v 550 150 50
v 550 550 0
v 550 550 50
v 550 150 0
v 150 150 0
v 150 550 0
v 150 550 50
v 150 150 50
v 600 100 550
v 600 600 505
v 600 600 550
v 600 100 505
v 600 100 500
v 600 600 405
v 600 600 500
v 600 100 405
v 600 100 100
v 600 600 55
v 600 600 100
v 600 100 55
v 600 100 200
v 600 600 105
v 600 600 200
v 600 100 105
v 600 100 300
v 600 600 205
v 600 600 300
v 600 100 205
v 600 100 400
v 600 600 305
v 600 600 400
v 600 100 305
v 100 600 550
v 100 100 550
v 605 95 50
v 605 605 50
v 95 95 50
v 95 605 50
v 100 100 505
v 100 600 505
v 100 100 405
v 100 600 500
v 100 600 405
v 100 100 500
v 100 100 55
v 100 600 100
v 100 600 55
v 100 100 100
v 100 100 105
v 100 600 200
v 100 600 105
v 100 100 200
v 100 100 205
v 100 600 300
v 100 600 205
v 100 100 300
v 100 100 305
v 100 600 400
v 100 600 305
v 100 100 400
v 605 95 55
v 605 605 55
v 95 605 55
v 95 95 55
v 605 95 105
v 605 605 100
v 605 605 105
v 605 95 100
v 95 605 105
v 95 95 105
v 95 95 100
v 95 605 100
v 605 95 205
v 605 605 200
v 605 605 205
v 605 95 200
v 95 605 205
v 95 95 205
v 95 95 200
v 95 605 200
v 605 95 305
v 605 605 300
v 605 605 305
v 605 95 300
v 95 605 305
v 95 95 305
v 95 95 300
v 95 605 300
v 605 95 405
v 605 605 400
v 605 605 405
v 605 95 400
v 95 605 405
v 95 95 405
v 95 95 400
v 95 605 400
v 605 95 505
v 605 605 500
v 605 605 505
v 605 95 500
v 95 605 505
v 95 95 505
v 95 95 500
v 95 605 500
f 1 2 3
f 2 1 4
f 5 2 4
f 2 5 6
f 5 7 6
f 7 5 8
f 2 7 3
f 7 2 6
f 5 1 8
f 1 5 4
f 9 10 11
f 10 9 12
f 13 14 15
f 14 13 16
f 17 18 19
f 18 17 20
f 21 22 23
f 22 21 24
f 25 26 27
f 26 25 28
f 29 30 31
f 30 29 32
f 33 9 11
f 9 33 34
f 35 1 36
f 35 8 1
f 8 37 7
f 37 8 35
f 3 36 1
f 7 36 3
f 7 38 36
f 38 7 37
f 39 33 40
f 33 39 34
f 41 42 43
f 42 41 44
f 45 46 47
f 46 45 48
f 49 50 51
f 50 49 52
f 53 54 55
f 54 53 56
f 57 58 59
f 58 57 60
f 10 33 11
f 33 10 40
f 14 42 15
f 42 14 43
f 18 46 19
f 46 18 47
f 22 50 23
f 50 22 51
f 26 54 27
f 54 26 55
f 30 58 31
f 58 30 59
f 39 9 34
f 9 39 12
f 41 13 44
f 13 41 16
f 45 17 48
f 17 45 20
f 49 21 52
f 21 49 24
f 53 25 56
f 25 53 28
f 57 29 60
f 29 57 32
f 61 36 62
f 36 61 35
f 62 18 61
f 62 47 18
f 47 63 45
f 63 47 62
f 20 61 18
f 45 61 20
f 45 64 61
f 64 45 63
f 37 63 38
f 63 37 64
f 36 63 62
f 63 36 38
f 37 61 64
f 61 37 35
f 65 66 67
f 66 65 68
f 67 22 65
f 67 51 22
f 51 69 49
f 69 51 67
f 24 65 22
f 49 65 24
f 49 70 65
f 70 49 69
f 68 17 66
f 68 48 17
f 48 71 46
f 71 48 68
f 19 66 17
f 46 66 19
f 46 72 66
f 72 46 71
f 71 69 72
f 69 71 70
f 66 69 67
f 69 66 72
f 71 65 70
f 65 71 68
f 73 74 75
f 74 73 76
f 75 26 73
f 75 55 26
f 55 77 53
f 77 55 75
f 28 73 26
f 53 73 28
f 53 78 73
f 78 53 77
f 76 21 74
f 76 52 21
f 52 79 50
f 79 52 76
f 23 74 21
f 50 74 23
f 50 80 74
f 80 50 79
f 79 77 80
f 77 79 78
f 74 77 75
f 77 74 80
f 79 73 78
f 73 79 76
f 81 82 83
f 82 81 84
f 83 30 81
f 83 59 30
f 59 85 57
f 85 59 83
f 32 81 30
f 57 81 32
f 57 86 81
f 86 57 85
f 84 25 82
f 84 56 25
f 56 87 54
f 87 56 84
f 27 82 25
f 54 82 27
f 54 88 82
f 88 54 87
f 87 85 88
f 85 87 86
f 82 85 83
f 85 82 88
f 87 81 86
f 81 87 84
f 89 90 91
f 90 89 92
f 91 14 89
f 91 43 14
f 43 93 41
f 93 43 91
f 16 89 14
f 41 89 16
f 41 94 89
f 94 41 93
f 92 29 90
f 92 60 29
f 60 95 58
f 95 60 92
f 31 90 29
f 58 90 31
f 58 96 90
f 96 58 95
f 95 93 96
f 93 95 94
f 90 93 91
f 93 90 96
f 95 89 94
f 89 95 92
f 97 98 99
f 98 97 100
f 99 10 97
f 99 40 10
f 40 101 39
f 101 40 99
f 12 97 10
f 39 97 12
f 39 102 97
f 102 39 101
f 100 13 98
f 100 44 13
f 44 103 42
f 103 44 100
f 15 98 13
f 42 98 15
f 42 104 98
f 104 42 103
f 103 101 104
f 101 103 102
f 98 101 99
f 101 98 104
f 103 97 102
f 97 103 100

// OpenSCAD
  
// standalone

translate([150, 150, 0]){
    color("Black")
    cube([400, 400, 400]);
}
translate([100, 100, 50]){
    color("Black")
    cube([500, 500, 500]);
}
translate([95, 95, 50]){
    color("White")
    cube([510, 510, 5]);
}
translate([95, 95, 100]){
    color("White")
    cube([510, 510, 5]);
}
translate([95, 95, 200]){
    color("White")
    cube([510, 510, 5]);
}
translate([95, 95, 300]){
    color("White")
    cube([510, 510, 5]);
}
translate([95, 95, 400]){
    color("White")
    cube([510, 510, 5]);
}
translate([95, 95, 500]){
    color("White")
    cube([510, 510, 5]);
}
